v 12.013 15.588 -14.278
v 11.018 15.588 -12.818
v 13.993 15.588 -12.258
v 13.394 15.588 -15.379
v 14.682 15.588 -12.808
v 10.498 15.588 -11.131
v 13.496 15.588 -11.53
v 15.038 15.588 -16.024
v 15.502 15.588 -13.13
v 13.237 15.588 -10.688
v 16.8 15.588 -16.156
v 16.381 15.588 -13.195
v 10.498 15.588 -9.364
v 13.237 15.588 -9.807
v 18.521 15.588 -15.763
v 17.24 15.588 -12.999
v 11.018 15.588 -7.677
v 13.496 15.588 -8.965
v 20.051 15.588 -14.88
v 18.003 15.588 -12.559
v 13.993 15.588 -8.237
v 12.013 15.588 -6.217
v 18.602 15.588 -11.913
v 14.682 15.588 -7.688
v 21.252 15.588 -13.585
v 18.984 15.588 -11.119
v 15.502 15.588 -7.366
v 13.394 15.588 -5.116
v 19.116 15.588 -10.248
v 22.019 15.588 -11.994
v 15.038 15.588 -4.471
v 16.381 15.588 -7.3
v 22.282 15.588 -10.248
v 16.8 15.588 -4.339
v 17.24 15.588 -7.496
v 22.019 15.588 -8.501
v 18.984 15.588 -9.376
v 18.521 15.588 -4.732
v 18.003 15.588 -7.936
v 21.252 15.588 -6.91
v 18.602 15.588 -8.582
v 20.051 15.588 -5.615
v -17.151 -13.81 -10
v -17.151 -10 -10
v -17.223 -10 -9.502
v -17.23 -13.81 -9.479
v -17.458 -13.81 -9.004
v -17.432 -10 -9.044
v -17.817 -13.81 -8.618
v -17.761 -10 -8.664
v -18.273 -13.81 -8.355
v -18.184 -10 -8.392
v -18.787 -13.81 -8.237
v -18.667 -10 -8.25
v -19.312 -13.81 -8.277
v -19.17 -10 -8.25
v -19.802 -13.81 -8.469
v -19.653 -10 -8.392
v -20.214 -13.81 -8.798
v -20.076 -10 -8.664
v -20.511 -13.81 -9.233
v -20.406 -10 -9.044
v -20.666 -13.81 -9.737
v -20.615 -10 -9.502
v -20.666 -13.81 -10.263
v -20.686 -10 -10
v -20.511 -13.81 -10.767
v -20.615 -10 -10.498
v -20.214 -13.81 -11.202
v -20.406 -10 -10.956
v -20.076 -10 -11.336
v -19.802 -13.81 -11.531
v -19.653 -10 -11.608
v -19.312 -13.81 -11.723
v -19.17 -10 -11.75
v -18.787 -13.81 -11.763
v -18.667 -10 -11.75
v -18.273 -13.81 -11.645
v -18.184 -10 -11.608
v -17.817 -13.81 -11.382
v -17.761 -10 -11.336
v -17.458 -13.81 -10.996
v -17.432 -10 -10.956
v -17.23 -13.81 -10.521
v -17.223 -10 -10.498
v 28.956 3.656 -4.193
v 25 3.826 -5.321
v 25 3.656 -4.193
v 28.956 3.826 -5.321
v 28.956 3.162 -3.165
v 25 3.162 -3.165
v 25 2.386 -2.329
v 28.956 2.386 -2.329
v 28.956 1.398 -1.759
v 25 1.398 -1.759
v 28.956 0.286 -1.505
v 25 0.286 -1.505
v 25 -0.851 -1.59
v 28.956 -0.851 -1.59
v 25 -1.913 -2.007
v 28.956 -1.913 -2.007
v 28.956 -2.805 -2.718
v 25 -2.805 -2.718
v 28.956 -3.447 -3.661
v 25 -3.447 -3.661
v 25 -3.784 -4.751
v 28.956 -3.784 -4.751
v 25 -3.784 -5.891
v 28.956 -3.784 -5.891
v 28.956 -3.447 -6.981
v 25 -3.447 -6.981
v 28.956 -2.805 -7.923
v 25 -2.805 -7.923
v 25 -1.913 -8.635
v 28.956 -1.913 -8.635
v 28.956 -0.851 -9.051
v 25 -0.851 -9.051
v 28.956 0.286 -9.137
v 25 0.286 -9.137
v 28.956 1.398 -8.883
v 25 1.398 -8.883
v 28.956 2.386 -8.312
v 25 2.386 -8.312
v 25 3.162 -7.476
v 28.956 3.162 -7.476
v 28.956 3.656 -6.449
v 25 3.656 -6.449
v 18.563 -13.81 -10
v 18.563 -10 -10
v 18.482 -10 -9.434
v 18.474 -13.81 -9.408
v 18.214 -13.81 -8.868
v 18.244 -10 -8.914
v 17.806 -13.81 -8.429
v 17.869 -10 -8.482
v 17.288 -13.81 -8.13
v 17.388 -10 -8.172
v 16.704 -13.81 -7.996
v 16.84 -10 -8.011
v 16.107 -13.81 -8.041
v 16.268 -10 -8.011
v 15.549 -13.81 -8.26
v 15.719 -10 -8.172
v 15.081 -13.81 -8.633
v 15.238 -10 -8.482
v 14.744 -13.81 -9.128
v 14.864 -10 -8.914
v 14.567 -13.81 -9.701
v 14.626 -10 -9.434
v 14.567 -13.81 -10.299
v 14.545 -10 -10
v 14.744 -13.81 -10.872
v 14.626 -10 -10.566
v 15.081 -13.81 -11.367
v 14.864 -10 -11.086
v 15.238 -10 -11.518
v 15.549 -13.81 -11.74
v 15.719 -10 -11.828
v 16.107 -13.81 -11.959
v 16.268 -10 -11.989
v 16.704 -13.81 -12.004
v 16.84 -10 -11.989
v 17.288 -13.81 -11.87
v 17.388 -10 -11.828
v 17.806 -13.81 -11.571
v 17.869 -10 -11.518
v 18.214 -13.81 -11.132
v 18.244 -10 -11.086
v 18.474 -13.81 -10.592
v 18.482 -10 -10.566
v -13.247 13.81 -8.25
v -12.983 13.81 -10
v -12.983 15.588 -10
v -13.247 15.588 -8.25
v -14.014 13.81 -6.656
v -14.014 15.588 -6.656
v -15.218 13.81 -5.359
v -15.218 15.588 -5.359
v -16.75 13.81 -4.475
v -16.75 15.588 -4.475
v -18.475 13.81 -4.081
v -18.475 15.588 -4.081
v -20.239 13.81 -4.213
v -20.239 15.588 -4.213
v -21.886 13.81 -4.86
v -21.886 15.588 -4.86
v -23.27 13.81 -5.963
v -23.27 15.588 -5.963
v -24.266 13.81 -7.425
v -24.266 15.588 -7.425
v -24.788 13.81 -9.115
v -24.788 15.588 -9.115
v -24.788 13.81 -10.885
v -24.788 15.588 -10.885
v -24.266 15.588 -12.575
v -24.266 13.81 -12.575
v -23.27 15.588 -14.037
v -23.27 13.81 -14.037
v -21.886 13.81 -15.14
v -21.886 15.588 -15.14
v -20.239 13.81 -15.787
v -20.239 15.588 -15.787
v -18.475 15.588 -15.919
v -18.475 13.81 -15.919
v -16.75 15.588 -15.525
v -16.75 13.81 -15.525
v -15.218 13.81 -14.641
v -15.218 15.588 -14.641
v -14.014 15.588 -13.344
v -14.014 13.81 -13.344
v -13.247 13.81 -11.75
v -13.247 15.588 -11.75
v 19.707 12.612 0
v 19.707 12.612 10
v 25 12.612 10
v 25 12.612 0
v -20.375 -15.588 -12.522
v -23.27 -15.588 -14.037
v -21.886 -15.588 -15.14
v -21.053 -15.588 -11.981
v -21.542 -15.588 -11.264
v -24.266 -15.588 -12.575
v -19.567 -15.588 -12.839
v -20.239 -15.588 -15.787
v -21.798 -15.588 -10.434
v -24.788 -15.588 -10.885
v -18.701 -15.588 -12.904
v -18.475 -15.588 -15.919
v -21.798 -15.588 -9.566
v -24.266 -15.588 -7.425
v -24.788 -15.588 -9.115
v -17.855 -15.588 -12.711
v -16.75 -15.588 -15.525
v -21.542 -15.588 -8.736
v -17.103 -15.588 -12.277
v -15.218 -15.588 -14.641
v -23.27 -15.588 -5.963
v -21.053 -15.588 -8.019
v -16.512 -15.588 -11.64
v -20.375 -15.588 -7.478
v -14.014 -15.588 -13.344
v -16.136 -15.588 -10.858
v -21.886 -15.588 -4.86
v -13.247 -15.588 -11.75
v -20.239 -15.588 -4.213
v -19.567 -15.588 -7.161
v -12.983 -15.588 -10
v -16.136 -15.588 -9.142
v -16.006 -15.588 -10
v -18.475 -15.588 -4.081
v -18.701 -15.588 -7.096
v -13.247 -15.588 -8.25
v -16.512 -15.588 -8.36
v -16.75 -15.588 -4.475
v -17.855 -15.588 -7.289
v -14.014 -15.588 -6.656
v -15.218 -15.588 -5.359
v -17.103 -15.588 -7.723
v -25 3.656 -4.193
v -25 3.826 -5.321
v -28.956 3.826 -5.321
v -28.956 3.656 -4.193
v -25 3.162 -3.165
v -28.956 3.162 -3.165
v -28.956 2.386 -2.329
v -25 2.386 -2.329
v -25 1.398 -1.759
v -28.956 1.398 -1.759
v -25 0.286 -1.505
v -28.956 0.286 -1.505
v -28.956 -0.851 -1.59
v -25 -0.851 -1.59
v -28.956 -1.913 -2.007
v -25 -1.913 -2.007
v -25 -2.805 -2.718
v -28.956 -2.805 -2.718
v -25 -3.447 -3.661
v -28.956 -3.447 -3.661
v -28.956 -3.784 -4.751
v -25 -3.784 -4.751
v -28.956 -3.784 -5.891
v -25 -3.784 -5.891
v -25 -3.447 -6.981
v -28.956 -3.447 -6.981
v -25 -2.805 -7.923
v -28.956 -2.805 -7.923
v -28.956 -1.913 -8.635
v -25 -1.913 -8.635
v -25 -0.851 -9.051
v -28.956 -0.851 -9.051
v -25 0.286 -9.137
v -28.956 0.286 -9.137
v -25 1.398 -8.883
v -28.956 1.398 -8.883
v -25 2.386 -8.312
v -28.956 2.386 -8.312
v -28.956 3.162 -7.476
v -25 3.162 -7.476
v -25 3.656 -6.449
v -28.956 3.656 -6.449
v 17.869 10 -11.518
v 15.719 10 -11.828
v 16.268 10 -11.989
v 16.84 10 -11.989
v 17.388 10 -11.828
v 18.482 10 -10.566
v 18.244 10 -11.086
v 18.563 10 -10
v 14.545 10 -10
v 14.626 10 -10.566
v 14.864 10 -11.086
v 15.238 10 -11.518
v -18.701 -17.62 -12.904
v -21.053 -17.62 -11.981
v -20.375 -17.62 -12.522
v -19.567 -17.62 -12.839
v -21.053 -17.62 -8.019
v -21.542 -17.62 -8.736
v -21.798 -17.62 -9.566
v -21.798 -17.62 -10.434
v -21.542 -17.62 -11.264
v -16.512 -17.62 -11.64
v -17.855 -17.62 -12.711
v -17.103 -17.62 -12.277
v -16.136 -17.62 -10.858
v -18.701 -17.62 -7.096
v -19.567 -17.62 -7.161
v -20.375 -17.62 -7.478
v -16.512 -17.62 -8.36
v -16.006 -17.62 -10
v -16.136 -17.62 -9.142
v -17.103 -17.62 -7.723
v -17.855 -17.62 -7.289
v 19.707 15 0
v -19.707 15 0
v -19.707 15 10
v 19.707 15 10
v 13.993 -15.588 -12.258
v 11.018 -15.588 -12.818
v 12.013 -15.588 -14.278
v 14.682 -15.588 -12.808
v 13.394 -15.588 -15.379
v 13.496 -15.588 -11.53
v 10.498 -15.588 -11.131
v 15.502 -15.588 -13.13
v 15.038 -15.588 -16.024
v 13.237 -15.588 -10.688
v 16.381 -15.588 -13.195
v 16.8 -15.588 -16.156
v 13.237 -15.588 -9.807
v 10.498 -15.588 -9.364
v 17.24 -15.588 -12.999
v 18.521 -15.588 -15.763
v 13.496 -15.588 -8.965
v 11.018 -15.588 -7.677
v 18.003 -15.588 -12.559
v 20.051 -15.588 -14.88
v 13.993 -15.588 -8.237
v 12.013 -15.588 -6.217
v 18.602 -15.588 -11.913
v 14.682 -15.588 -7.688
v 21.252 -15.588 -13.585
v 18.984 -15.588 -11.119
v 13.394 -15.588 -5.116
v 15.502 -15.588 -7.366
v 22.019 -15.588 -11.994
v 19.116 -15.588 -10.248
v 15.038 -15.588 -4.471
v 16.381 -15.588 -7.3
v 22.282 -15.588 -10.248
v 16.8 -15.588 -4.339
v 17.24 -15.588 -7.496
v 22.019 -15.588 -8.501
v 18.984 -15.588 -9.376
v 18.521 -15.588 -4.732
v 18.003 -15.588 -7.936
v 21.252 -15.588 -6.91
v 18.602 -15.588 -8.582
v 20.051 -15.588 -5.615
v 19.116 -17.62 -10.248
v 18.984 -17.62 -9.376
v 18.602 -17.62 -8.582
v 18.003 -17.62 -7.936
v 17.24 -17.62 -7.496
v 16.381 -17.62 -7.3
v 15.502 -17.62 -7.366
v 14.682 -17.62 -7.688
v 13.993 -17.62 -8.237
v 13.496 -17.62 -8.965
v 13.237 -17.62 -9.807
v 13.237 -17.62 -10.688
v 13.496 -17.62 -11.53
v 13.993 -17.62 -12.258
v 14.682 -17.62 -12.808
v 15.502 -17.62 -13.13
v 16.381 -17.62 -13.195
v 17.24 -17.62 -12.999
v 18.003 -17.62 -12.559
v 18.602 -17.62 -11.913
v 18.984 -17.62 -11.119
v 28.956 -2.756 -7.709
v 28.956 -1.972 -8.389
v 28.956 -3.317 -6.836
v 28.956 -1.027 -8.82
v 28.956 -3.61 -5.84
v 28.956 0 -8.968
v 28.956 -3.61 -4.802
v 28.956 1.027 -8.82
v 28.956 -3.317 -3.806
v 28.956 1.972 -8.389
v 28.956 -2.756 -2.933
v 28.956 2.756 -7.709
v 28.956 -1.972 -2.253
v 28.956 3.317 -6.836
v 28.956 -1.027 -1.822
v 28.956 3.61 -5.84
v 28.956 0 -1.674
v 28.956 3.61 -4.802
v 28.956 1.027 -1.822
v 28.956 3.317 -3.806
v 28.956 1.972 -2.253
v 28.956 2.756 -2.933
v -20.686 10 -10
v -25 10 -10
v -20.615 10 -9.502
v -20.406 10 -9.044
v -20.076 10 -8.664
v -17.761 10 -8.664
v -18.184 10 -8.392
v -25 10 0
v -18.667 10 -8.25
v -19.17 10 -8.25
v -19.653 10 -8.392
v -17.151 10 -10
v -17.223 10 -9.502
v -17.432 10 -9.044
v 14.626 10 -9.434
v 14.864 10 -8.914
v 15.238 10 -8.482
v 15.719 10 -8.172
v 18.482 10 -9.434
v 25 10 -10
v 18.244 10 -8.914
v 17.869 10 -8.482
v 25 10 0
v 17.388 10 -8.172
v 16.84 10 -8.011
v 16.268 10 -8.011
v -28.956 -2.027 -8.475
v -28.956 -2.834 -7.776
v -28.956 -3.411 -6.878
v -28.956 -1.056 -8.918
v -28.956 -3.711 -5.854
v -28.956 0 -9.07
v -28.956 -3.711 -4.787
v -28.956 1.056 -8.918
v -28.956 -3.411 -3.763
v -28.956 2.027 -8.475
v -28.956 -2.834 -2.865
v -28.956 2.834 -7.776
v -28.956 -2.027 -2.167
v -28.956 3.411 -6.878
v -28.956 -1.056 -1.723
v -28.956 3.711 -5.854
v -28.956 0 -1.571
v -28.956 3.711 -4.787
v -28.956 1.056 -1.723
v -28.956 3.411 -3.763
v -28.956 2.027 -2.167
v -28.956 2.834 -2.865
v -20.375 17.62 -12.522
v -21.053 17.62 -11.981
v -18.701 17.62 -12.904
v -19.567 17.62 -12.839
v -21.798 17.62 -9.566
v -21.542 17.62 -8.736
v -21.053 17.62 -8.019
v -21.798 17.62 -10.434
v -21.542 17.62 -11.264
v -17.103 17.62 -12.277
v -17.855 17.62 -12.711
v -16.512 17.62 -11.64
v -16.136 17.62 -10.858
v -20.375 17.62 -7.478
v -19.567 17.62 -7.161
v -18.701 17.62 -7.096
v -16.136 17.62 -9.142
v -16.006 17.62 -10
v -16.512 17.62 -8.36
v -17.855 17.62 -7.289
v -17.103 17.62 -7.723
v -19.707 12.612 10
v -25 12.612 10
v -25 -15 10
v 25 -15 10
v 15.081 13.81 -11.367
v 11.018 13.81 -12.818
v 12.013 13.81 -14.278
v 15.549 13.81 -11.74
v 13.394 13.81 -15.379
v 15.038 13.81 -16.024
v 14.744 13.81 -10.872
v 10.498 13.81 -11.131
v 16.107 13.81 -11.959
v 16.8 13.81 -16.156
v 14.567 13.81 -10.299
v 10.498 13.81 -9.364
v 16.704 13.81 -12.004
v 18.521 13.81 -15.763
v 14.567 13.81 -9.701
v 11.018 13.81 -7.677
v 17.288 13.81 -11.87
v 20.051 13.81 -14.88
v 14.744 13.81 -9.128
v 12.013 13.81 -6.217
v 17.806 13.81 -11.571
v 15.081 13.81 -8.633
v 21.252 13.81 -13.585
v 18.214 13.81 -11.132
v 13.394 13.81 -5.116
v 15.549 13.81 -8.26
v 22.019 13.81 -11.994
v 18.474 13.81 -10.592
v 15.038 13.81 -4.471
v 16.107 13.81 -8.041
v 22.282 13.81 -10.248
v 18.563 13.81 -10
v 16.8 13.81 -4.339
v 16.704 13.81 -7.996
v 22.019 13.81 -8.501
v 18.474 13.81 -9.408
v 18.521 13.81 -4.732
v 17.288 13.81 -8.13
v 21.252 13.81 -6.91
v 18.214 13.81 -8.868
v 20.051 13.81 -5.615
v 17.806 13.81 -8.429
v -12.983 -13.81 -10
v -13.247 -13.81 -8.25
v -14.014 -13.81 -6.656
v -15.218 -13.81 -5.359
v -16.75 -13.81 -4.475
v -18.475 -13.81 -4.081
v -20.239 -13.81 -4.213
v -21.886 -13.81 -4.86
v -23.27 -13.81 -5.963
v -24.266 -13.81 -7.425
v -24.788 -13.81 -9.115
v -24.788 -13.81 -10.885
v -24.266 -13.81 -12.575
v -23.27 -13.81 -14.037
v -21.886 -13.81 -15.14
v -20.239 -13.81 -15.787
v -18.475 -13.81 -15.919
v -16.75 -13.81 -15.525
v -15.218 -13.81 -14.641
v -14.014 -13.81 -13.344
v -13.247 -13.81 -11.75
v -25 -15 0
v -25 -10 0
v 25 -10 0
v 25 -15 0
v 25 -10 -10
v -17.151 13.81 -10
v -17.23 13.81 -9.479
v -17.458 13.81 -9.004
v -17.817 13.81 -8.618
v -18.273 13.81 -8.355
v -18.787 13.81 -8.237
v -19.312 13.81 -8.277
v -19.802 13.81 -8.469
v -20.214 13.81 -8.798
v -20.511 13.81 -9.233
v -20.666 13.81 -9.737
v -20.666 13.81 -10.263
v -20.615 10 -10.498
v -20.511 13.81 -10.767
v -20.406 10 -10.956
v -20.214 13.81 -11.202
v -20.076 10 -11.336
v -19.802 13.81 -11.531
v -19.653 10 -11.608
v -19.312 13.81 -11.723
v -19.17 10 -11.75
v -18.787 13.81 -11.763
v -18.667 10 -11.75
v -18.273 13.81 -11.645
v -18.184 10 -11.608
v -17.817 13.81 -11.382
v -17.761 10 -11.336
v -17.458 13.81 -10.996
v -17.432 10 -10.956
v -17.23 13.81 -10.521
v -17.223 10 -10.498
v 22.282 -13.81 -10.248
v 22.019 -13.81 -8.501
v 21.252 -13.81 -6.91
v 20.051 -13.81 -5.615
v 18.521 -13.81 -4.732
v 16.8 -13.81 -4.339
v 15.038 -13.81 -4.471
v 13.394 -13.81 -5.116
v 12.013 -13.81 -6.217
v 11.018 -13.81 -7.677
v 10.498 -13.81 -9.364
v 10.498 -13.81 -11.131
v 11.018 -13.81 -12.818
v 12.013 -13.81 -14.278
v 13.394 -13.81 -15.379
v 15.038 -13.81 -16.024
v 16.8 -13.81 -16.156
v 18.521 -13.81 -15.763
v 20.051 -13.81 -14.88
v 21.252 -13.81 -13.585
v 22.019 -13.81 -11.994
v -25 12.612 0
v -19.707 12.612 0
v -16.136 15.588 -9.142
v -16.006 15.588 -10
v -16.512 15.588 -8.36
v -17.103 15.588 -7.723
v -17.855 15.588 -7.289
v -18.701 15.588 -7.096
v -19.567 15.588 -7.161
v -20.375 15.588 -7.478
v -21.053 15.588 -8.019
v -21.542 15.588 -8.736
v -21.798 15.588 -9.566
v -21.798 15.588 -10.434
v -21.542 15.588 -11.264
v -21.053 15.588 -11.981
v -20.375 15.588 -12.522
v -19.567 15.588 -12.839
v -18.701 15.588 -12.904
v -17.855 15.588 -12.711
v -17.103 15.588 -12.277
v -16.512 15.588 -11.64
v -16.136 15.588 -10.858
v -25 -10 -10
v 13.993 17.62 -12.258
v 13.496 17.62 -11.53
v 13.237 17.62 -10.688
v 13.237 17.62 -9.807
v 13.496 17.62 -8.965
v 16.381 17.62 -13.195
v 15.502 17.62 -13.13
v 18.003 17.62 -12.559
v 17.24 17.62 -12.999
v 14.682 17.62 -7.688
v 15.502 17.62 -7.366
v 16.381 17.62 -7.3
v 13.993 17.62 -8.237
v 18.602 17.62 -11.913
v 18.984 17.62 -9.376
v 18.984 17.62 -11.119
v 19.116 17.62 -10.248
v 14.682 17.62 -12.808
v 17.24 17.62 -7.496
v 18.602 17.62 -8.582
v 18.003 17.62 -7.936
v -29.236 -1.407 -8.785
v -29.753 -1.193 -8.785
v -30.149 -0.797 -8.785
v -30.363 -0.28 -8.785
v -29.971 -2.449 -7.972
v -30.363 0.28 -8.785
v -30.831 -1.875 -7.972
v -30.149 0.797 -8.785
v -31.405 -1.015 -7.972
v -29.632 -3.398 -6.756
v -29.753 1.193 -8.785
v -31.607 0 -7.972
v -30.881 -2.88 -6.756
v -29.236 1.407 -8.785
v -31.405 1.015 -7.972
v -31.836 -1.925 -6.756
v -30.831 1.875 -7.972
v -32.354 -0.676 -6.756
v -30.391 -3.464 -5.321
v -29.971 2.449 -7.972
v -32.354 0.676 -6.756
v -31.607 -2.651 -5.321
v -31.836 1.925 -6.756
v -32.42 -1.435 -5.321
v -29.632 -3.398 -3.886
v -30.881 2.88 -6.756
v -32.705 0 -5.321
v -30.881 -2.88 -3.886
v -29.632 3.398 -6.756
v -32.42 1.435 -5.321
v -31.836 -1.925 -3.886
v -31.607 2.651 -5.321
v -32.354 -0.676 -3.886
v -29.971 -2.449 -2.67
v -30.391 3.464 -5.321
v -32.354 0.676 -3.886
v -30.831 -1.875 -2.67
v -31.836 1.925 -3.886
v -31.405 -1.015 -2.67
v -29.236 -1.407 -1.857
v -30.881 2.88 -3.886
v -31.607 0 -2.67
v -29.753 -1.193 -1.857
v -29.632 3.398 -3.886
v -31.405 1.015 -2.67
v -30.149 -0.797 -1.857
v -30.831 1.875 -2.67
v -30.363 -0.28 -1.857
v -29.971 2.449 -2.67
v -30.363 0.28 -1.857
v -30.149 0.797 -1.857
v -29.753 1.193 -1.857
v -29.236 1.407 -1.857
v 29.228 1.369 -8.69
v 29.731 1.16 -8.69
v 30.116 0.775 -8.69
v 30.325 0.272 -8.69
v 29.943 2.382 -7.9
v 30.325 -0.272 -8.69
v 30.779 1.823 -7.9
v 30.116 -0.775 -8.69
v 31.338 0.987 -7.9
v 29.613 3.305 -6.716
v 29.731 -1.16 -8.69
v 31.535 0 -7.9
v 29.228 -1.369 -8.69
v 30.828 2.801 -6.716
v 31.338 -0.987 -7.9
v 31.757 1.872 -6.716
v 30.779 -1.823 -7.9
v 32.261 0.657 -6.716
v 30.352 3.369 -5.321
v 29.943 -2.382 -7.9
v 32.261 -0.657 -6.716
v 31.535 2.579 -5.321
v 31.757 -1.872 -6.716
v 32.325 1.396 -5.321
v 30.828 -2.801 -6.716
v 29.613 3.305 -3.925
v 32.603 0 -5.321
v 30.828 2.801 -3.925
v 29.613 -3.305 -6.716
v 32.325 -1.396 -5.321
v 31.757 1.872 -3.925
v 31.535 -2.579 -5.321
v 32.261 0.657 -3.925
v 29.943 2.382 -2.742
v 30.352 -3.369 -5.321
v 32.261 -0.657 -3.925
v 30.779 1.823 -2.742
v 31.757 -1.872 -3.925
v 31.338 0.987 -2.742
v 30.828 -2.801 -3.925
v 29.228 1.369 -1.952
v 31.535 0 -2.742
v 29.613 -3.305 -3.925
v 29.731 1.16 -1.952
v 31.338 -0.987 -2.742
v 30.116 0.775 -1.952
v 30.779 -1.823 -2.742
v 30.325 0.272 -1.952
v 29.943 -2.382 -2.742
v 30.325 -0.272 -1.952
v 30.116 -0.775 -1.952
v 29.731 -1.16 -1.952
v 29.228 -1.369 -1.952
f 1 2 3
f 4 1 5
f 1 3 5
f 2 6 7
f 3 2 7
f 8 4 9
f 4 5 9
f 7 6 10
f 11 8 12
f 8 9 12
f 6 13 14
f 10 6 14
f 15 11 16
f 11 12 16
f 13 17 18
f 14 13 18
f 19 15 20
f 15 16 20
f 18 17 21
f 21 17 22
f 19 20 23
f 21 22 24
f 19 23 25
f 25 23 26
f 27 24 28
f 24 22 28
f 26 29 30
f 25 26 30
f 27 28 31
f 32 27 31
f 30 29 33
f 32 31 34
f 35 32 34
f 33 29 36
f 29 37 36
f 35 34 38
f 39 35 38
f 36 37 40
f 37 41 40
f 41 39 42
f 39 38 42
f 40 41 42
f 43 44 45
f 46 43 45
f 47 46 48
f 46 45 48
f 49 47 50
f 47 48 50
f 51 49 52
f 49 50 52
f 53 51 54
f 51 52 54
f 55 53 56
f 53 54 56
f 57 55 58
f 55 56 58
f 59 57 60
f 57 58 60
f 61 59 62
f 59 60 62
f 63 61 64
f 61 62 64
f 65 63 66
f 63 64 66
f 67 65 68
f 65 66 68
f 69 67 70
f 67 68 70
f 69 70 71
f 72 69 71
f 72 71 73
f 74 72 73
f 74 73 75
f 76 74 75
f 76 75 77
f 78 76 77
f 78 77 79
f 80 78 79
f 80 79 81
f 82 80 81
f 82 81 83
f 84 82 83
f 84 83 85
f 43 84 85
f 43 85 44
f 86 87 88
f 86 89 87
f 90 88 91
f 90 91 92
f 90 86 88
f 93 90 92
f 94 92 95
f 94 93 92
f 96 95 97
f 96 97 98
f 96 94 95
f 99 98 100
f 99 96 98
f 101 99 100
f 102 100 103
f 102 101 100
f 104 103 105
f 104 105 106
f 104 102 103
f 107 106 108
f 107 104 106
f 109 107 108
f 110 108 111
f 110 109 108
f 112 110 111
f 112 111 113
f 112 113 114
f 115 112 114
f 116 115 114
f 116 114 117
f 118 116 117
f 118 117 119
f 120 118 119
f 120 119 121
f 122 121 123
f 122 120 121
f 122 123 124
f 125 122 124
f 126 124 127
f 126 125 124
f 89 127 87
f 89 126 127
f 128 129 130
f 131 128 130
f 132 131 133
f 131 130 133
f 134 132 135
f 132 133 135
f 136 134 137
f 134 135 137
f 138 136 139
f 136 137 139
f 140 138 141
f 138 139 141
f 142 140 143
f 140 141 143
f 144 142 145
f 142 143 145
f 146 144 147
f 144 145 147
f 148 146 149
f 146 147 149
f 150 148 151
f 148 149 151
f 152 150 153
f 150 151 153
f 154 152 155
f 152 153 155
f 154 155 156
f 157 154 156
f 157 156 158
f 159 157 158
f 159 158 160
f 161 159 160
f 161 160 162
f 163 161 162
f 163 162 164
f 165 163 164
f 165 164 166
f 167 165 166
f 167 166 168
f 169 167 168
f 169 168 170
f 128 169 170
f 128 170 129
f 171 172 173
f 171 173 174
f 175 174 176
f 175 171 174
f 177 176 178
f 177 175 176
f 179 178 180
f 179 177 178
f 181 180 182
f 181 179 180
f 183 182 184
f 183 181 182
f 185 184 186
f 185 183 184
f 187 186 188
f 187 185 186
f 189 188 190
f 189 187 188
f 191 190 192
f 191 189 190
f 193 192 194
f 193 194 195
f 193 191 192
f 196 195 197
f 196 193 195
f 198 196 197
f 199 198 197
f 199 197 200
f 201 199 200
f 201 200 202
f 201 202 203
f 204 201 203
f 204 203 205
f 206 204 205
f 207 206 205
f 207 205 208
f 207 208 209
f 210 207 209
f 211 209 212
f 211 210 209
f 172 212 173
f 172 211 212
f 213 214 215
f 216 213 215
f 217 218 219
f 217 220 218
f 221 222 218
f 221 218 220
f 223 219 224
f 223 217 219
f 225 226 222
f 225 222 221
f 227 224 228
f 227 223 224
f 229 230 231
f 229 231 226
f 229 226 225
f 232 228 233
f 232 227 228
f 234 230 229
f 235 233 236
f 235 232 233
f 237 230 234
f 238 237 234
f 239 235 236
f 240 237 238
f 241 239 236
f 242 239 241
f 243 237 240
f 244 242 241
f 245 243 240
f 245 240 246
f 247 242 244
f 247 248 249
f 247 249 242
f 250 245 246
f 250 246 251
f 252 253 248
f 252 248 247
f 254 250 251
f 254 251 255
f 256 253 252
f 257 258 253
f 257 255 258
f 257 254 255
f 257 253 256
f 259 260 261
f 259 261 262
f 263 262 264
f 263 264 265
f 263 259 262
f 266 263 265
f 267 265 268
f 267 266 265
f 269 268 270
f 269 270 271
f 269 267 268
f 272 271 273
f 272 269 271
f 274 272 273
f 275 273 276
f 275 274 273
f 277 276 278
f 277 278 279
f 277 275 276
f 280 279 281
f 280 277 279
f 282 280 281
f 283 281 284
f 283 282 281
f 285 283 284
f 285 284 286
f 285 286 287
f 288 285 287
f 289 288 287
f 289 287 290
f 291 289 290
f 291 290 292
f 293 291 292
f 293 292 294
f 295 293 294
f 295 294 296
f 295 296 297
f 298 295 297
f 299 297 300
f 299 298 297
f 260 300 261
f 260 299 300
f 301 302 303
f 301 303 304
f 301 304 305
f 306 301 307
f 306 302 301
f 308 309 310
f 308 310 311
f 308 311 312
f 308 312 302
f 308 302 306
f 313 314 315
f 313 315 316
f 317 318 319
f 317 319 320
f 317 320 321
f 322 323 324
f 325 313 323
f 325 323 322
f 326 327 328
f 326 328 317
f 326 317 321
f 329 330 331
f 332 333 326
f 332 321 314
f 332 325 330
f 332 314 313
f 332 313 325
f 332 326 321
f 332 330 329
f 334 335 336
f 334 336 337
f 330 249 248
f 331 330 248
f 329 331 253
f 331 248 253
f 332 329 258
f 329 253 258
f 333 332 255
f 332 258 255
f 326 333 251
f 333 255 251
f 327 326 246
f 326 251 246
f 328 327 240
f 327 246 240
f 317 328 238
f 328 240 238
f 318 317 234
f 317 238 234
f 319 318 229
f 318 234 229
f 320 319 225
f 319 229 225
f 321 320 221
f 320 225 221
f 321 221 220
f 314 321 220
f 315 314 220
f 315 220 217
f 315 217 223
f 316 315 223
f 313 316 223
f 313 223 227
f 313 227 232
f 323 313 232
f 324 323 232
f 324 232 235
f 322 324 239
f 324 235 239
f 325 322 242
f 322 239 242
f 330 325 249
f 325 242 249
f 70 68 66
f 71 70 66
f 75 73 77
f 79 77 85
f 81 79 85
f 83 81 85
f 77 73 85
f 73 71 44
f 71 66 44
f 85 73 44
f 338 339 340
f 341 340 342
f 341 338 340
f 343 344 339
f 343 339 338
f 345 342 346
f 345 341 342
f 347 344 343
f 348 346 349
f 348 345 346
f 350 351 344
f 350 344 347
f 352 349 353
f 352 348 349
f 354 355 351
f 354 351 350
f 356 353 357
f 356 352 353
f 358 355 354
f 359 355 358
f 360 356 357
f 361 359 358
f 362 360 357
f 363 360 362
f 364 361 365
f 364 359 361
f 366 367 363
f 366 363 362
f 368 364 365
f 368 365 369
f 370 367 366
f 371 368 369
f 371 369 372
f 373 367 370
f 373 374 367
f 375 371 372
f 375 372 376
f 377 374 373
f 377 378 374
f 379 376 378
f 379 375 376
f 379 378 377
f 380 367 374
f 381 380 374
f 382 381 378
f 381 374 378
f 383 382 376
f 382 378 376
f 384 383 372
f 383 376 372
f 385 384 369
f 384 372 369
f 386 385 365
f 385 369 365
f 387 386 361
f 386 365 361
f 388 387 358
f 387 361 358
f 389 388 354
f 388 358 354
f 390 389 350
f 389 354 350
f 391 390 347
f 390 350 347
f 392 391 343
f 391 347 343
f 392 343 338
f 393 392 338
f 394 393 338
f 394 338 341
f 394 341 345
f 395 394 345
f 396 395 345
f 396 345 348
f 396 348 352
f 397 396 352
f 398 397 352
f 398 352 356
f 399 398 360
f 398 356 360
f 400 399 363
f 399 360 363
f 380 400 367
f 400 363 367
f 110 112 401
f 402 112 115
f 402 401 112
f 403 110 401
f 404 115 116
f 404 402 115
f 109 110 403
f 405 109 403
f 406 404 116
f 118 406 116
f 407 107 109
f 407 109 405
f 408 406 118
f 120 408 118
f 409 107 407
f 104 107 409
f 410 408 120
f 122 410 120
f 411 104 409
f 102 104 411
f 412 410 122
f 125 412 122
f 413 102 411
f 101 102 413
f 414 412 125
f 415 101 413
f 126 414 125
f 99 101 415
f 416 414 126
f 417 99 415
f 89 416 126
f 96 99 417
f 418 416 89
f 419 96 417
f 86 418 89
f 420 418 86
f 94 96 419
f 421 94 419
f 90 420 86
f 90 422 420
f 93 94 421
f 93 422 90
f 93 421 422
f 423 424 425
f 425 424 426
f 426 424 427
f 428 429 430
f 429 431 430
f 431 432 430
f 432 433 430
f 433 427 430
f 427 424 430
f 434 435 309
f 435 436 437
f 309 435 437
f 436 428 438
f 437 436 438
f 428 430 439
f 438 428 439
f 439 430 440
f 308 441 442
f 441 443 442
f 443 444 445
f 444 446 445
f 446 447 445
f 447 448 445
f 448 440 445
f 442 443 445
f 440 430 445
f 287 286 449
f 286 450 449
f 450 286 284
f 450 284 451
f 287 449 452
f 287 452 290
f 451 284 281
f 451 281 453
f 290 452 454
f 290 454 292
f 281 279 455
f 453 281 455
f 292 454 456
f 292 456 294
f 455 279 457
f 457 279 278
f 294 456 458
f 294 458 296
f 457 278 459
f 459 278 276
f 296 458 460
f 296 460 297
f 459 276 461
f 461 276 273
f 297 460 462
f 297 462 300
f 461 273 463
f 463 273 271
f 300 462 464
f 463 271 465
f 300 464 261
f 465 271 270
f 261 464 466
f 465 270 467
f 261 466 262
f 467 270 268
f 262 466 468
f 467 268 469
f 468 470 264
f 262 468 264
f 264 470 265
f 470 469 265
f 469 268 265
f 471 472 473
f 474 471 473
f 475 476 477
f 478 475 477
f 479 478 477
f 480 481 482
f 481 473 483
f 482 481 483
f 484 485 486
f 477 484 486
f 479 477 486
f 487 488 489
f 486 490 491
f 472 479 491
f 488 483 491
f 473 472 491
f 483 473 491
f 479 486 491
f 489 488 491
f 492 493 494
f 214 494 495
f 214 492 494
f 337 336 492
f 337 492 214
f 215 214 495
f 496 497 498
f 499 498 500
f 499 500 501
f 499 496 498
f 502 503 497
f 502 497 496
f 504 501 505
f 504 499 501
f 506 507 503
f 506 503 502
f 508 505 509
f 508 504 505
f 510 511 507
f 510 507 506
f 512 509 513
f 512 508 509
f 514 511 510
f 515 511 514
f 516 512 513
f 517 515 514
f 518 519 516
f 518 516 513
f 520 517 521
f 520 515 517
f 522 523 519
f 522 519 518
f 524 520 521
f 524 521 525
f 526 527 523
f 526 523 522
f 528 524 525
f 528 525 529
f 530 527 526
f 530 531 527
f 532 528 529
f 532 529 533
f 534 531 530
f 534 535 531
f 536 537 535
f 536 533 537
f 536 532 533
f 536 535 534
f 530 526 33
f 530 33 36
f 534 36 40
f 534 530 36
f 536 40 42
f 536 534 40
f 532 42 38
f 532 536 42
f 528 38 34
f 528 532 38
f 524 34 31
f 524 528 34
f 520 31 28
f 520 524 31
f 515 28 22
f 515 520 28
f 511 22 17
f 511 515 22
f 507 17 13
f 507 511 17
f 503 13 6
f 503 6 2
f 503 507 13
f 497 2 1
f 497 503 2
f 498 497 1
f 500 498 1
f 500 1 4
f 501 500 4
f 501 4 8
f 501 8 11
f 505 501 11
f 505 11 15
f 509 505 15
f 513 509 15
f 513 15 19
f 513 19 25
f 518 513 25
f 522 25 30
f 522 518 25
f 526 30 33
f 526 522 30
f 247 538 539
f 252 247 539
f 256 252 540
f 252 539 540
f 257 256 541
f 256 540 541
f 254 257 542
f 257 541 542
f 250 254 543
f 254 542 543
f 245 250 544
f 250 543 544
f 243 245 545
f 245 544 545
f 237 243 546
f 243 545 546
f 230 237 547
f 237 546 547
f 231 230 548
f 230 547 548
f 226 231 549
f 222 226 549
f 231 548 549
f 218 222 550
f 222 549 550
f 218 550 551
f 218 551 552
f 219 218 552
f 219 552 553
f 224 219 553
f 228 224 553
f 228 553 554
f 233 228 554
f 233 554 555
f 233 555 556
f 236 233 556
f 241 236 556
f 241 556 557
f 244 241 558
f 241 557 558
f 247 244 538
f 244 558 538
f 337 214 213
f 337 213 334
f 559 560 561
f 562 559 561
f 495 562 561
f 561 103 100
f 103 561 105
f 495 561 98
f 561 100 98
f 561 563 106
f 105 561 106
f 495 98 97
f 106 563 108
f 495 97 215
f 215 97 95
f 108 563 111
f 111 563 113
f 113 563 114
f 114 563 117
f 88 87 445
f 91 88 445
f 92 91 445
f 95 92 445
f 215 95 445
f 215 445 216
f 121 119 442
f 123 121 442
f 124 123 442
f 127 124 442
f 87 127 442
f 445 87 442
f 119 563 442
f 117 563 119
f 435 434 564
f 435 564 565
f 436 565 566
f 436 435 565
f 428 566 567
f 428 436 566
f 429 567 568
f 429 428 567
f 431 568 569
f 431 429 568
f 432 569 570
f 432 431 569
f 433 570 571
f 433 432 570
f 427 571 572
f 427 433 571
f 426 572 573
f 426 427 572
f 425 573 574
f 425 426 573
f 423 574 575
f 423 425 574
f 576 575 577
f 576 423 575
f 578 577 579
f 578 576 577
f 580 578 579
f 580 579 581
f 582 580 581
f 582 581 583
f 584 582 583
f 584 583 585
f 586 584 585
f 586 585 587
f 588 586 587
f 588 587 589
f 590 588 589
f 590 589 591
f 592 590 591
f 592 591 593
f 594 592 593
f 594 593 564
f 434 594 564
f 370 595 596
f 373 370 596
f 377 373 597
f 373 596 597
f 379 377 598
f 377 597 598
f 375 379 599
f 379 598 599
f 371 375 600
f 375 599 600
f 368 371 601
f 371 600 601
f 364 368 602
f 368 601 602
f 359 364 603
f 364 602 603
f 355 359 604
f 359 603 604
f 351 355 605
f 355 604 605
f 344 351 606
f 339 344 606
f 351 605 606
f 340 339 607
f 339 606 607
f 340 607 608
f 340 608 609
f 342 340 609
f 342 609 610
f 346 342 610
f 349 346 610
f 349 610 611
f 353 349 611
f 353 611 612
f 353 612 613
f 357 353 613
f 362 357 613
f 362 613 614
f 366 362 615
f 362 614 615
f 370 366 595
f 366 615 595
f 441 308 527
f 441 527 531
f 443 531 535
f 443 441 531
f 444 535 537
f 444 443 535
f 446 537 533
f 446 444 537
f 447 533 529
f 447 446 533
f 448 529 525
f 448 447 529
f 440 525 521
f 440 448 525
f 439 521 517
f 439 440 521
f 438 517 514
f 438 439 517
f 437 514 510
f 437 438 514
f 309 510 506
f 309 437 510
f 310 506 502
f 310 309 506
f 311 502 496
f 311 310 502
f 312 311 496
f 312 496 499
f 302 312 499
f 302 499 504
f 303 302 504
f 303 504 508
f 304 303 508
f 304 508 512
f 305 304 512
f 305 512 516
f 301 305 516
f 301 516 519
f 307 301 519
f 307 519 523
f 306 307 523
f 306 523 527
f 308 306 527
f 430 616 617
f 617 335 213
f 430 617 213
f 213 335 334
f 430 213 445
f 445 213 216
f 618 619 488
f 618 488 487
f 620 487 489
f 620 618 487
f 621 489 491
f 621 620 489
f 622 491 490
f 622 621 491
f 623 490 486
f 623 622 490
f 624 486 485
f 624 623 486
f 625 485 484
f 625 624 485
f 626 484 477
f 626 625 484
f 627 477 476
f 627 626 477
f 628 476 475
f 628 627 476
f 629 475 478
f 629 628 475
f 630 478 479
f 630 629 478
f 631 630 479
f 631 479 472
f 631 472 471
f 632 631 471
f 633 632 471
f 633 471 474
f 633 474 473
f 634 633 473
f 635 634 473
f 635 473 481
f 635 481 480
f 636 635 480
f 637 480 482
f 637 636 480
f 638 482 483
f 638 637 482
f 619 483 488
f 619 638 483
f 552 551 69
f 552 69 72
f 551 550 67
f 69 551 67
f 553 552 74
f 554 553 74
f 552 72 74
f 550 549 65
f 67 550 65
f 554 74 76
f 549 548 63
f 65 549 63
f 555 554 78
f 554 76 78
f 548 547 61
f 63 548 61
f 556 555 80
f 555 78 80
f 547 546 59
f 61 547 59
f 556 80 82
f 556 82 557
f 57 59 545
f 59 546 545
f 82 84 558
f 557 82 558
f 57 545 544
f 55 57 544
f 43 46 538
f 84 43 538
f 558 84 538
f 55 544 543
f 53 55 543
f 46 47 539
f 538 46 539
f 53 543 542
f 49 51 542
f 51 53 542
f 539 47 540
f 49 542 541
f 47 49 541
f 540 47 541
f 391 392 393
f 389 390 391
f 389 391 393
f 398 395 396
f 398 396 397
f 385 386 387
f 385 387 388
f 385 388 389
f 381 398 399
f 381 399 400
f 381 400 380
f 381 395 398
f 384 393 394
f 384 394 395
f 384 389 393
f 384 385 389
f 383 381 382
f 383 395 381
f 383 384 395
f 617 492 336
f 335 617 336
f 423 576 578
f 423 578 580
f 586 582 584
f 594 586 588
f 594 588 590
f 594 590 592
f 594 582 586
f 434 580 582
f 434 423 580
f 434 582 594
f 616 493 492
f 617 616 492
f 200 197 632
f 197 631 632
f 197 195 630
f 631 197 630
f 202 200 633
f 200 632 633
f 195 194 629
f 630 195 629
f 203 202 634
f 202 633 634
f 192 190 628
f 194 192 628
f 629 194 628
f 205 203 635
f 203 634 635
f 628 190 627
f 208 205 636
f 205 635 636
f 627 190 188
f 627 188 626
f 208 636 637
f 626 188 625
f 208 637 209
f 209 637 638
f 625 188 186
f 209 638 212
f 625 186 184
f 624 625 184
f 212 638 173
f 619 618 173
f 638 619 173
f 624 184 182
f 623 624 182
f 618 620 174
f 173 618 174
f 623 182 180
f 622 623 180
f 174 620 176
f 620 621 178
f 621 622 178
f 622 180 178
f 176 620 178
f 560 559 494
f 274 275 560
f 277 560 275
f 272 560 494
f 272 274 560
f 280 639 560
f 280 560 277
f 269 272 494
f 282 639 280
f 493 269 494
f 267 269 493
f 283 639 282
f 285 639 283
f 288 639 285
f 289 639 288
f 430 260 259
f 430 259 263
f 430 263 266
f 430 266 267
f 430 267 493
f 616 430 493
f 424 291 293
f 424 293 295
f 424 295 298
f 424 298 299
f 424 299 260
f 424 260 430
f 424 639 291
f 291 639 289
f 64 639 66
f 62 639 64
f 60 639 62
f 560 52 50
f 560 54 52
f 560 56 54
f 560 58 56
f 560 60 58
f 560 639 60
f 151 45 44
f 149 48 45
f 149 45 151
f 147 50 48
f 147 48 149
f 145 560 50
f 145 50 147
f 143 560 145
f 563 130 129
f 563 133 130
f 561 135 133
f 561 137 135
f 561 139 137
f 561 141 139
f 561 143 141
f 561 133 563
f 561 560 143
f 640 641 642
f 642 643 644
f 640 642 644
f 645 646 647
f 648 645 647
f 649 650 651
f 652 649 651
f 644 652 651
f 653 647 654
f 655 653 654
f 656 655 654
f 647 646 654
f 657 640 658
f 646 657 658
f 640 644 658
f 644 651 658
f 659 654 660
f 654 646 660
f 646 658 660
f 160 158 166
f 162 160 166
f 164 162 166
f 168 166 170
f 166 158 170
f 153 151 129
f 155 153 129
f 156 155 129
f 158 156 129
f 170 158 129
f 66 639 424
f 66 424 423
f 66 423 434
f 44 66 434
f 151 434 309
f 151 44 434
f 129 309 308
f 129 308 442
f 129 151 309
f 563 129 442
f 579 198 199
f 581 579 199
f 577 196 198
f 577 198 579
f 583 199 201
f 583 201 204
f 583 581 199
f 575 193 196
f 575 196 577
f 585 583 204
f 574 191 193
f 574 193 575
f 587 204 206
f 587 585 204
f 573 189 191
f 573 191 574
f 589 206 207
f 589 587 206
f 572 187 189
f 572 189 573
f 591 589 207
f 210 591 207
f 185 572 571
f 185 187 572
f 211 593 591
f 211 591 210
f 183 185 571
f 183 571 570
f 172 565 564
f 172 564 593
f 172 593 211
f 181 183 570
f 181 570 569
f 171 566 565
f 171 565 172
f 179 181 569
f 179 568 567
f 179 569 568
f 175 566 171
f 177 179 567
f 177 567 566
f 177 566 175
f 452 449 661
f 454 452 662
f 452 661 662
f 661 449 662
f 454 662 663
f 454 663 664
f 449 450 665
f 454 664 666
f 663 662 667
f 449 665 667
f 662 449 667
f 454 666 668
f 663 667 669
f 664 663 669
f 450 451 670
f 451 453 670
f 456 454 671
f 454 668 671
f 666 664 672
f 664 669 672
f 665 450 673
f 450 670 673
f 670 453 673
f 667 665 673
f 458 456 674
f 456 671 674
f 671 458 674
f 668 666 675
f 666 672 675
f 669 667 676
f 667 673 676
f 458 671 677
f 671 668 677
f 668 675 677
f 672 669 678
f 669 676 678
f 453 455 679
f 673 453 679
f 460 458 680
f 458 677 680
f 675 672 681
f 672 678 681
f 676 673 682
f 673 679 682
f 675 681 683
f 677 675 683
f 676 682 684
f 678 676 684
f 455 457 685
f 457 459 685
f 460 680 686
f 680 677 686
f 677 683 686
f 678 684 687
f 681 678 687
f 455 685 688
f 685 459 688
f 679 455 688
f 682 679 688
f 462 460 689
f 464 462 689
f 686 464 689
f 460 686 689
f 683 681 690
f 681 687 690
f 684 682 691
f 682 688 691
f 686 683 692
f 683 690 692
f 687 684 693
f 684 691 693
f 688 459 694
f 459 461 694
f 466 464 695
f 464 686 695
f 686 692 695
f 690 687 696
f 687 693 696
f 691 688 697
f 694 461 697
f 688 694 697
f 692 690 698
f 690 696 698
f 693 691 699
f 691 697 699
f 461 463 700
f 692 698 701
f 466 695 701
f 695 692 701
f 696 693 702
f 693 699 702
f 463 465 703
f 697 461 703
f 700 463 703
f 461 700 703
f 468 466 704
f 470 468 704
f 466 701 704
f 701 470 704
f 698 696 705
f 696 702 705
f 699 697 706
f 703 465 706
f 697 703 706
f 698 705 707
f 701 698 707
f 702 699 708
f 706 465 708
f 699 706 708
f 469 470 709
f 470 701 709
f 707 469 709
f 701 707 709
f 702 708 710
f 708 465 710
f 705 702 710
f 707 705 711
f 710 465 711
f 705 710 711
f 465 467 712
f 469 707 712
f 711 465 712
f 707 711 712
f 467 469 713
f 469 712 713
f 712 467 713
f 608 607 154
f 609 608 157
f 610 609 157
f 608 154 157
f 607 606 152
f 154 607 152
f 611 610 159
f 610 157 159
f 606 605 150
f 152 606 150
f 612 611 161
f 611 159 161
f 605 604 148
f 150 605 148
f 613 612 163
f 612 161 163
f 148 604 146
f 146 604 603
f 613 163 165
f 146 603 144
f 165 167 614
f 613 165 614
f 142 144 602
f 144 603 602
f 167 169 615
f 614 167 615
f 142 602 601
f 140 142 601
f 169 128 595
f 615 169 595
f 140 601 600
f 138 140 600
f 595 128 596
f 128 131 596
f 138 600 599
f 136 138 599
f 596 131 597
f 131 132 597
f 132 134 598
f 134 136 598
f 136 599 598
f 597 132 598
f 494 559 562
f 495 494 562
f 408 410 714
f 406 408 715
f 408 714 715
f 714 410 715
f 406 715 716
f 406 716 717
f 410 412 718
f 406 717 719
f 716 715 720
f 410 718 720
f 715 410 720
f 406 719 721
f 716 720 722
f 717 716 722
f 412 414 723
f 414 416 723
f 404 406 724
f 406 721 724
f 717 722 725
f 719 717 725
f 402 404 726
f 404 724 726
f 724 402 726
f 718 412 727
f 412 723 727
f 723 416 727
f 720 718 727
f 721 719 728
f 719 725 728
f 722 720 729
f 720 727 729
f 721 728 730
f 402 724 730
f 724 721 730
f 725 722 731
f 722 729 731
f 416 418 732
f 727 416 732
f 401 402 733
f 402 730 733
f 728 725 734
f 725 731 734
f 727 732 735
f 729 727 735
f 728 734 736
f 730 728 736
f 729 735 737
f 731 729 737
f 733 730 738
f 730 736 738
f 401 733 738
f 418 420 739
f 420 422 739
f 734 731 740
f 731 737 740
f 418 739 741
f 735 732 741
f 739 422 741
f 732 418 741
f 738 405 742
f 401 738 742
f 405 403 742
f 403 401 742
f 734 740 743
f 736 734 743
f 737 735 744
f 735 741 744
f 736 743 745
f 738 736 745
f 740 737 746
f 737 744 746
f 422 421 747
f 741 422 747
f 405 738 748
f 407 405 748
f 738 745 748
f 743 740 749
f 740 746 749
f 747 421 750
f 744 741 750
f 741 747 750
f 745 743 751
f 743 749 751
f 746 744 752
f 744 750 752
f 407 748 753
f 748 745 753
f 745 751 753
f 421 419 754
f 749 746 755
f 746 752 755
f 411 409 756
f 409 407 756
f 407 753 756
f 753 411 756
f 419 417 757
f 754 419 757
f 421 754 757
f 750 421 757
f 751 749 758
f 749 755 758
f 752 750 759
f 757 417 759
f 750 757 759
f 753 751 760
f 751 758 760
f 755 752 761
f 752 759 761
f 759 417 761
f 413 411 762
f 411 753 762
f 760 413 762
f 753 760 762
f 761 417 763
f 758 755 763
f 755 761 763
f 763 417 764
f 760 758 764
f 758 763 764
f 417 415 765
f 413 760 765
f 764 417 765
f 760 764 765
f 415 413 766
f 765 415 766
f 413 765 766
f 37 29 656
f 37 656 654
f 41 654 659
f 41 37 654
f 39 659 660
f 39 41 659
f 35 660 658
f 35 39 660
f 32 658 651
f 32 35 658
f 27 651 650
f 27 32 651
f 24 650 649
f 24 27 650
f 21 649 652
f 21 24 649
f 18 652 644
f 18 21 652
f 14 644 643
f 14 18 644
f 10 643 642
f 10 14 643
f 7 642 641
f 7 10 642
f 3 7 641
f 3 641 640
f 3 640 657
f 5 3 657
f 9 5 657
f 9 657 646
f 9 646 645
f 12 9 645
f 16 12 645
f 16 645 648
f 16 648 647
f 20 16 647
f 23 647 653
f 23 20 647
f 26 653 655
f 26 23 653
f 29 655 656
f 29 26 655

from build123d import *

# Parameters (mm, degrees)
F0_W      = 50
F0_H      = 20
F1_DEPTH  = 10
F2_W      = 50
F2_H      = 30
F3_DEPTH  = 10
F4_R      = 3.8263869055
F5_DEPTH  = 28.956
F10_W     = 5.2931006998
F10_H     = 2.3875854537
F10_W_2   = 5.2931062877
F11_DEPTH = 20.001
F12_R     = 1.7676057038
F12_R_2   = 2.0091255021
F13_DEPTH = 3.81
F14_R     = 5.9356630849
F14_R_2   = 5.9251919842
F15_DEPTH = 1.778
F16_R     = 2.9121930079
F16_R_2   = 2.9560346156
F17_DEPTH = 2.032


# Not quite as in the source:
# - a pattern or mirror of a feature is missing from the dataset's text; its kind, count and spacing are read off the source's solid


with BuildPart() as f1:
    # F0 (on Front) → F1 (new body, symmetric)
    with BuildSketch(Plane.XZ):
        Rectangle(F0_W, F0_H)
    extrude(amount=F1_DEPTH, both=True)

    # F2 (on Top) → F3 (join)
    with BuildSketch(Plane.XY):
        Rectangle(F2_W, F2_H)
    extrude(amount=F3_DEPTH)

    # F4 (on Right) → F5 (join, symmetric)
    with BuildSketch(Plane.YZ):
        with Locations((0, -5.3208619356)):
            Circle(F4_R)
    extrude(amount=F5_DEPTH, both=True)

    # F6 (on face) → F7 (revolve)
    with BuildSketch(Plane(origin=(-28.956, 0, 0), x_dir=(0, -1, 0), z_dir=(-1, 0, 0))):
        with BuildLine():
            Line((0, -1.5713692232), (0, -9.0703546481))
            ThreePointArc((0, -9.0703546481), (3.7494927125, -5.3208619356), (0, -1.5713692232))
        make_face()
    revolve(axis=Axis((-28.956, 0, -5.2824148391), (0, 0, -1)))

    # F8 (on face) → F9 (revolve)
    with BuildSketch(Plane.YZ.offset(28.956)):
        with BuildLine():
            Line((0, -1.6739376972), (0, -8.967786174))
            ThreePointArc((0, -8.967786174), (3.6469242384, -5.3208619356), (0, -1.6739376972))
        make_face()
    revolve(axis=Axis((28.956, 0, -5.3208619356), (0, 0, -1)))

    # F10 (on face) → F11 (cut, through all)
    with BuildSketch(Plane.XY.offset(10)):
        with Locations((-22.3534496501, 13.8062072732)):
            Rectangle(F10_W, F10_H)
        with Locations((22.3534468561, 13.8062072732)):
            Rectangle(F10_W_2, F10_H)
    extrude(amount=-F11_DEPTH, mode=Mode.SUBTRACT)

    # F12 (on face) → F13 (join)
    with BuildSketch(Plane.XZ.offset(10)):
        with Locations((-18.9186222851, -10)):
            Circle(F12_R)
        with Locations((16.5537931025, -10)):
            Circle(F12_R_2)
    f13 = extrude(amount=F13_DEPTH)

    # F13_copies: F13 across plane
    add(f13.mirror(Plane.ZX))

    # F14 (on face) → F15 (join)
    with BuildSketch(Plane.XZ.offset(13.81)):
        with Locations((-18.9186222851, -10)):
            Circle(F14_R)
        with Locations((16.3567233831, -10.247586295)):
            Circle(F14_R_2)
    f15 = extrude(amount=F15_DEPTH)

    # F15_copies: F15 across plane
    add(f15.mirror(Plane.ZX))

    # F16 (on face) → F17 (join)
    with BuildSketch(Plane.XZ.offset(15.588)):
        with Locations((-18.9186222851, -10)):
            Circle(F16_R)
        with Locations((16.1596573889, -10.247586295)):
            Circle(F16_R_2)
    f17 = extrude(amount=F17_DEPTH)

    # F17_copies: F17 across plane
    add(f17.mirror(Plane.ZX))


solid = f1.part
